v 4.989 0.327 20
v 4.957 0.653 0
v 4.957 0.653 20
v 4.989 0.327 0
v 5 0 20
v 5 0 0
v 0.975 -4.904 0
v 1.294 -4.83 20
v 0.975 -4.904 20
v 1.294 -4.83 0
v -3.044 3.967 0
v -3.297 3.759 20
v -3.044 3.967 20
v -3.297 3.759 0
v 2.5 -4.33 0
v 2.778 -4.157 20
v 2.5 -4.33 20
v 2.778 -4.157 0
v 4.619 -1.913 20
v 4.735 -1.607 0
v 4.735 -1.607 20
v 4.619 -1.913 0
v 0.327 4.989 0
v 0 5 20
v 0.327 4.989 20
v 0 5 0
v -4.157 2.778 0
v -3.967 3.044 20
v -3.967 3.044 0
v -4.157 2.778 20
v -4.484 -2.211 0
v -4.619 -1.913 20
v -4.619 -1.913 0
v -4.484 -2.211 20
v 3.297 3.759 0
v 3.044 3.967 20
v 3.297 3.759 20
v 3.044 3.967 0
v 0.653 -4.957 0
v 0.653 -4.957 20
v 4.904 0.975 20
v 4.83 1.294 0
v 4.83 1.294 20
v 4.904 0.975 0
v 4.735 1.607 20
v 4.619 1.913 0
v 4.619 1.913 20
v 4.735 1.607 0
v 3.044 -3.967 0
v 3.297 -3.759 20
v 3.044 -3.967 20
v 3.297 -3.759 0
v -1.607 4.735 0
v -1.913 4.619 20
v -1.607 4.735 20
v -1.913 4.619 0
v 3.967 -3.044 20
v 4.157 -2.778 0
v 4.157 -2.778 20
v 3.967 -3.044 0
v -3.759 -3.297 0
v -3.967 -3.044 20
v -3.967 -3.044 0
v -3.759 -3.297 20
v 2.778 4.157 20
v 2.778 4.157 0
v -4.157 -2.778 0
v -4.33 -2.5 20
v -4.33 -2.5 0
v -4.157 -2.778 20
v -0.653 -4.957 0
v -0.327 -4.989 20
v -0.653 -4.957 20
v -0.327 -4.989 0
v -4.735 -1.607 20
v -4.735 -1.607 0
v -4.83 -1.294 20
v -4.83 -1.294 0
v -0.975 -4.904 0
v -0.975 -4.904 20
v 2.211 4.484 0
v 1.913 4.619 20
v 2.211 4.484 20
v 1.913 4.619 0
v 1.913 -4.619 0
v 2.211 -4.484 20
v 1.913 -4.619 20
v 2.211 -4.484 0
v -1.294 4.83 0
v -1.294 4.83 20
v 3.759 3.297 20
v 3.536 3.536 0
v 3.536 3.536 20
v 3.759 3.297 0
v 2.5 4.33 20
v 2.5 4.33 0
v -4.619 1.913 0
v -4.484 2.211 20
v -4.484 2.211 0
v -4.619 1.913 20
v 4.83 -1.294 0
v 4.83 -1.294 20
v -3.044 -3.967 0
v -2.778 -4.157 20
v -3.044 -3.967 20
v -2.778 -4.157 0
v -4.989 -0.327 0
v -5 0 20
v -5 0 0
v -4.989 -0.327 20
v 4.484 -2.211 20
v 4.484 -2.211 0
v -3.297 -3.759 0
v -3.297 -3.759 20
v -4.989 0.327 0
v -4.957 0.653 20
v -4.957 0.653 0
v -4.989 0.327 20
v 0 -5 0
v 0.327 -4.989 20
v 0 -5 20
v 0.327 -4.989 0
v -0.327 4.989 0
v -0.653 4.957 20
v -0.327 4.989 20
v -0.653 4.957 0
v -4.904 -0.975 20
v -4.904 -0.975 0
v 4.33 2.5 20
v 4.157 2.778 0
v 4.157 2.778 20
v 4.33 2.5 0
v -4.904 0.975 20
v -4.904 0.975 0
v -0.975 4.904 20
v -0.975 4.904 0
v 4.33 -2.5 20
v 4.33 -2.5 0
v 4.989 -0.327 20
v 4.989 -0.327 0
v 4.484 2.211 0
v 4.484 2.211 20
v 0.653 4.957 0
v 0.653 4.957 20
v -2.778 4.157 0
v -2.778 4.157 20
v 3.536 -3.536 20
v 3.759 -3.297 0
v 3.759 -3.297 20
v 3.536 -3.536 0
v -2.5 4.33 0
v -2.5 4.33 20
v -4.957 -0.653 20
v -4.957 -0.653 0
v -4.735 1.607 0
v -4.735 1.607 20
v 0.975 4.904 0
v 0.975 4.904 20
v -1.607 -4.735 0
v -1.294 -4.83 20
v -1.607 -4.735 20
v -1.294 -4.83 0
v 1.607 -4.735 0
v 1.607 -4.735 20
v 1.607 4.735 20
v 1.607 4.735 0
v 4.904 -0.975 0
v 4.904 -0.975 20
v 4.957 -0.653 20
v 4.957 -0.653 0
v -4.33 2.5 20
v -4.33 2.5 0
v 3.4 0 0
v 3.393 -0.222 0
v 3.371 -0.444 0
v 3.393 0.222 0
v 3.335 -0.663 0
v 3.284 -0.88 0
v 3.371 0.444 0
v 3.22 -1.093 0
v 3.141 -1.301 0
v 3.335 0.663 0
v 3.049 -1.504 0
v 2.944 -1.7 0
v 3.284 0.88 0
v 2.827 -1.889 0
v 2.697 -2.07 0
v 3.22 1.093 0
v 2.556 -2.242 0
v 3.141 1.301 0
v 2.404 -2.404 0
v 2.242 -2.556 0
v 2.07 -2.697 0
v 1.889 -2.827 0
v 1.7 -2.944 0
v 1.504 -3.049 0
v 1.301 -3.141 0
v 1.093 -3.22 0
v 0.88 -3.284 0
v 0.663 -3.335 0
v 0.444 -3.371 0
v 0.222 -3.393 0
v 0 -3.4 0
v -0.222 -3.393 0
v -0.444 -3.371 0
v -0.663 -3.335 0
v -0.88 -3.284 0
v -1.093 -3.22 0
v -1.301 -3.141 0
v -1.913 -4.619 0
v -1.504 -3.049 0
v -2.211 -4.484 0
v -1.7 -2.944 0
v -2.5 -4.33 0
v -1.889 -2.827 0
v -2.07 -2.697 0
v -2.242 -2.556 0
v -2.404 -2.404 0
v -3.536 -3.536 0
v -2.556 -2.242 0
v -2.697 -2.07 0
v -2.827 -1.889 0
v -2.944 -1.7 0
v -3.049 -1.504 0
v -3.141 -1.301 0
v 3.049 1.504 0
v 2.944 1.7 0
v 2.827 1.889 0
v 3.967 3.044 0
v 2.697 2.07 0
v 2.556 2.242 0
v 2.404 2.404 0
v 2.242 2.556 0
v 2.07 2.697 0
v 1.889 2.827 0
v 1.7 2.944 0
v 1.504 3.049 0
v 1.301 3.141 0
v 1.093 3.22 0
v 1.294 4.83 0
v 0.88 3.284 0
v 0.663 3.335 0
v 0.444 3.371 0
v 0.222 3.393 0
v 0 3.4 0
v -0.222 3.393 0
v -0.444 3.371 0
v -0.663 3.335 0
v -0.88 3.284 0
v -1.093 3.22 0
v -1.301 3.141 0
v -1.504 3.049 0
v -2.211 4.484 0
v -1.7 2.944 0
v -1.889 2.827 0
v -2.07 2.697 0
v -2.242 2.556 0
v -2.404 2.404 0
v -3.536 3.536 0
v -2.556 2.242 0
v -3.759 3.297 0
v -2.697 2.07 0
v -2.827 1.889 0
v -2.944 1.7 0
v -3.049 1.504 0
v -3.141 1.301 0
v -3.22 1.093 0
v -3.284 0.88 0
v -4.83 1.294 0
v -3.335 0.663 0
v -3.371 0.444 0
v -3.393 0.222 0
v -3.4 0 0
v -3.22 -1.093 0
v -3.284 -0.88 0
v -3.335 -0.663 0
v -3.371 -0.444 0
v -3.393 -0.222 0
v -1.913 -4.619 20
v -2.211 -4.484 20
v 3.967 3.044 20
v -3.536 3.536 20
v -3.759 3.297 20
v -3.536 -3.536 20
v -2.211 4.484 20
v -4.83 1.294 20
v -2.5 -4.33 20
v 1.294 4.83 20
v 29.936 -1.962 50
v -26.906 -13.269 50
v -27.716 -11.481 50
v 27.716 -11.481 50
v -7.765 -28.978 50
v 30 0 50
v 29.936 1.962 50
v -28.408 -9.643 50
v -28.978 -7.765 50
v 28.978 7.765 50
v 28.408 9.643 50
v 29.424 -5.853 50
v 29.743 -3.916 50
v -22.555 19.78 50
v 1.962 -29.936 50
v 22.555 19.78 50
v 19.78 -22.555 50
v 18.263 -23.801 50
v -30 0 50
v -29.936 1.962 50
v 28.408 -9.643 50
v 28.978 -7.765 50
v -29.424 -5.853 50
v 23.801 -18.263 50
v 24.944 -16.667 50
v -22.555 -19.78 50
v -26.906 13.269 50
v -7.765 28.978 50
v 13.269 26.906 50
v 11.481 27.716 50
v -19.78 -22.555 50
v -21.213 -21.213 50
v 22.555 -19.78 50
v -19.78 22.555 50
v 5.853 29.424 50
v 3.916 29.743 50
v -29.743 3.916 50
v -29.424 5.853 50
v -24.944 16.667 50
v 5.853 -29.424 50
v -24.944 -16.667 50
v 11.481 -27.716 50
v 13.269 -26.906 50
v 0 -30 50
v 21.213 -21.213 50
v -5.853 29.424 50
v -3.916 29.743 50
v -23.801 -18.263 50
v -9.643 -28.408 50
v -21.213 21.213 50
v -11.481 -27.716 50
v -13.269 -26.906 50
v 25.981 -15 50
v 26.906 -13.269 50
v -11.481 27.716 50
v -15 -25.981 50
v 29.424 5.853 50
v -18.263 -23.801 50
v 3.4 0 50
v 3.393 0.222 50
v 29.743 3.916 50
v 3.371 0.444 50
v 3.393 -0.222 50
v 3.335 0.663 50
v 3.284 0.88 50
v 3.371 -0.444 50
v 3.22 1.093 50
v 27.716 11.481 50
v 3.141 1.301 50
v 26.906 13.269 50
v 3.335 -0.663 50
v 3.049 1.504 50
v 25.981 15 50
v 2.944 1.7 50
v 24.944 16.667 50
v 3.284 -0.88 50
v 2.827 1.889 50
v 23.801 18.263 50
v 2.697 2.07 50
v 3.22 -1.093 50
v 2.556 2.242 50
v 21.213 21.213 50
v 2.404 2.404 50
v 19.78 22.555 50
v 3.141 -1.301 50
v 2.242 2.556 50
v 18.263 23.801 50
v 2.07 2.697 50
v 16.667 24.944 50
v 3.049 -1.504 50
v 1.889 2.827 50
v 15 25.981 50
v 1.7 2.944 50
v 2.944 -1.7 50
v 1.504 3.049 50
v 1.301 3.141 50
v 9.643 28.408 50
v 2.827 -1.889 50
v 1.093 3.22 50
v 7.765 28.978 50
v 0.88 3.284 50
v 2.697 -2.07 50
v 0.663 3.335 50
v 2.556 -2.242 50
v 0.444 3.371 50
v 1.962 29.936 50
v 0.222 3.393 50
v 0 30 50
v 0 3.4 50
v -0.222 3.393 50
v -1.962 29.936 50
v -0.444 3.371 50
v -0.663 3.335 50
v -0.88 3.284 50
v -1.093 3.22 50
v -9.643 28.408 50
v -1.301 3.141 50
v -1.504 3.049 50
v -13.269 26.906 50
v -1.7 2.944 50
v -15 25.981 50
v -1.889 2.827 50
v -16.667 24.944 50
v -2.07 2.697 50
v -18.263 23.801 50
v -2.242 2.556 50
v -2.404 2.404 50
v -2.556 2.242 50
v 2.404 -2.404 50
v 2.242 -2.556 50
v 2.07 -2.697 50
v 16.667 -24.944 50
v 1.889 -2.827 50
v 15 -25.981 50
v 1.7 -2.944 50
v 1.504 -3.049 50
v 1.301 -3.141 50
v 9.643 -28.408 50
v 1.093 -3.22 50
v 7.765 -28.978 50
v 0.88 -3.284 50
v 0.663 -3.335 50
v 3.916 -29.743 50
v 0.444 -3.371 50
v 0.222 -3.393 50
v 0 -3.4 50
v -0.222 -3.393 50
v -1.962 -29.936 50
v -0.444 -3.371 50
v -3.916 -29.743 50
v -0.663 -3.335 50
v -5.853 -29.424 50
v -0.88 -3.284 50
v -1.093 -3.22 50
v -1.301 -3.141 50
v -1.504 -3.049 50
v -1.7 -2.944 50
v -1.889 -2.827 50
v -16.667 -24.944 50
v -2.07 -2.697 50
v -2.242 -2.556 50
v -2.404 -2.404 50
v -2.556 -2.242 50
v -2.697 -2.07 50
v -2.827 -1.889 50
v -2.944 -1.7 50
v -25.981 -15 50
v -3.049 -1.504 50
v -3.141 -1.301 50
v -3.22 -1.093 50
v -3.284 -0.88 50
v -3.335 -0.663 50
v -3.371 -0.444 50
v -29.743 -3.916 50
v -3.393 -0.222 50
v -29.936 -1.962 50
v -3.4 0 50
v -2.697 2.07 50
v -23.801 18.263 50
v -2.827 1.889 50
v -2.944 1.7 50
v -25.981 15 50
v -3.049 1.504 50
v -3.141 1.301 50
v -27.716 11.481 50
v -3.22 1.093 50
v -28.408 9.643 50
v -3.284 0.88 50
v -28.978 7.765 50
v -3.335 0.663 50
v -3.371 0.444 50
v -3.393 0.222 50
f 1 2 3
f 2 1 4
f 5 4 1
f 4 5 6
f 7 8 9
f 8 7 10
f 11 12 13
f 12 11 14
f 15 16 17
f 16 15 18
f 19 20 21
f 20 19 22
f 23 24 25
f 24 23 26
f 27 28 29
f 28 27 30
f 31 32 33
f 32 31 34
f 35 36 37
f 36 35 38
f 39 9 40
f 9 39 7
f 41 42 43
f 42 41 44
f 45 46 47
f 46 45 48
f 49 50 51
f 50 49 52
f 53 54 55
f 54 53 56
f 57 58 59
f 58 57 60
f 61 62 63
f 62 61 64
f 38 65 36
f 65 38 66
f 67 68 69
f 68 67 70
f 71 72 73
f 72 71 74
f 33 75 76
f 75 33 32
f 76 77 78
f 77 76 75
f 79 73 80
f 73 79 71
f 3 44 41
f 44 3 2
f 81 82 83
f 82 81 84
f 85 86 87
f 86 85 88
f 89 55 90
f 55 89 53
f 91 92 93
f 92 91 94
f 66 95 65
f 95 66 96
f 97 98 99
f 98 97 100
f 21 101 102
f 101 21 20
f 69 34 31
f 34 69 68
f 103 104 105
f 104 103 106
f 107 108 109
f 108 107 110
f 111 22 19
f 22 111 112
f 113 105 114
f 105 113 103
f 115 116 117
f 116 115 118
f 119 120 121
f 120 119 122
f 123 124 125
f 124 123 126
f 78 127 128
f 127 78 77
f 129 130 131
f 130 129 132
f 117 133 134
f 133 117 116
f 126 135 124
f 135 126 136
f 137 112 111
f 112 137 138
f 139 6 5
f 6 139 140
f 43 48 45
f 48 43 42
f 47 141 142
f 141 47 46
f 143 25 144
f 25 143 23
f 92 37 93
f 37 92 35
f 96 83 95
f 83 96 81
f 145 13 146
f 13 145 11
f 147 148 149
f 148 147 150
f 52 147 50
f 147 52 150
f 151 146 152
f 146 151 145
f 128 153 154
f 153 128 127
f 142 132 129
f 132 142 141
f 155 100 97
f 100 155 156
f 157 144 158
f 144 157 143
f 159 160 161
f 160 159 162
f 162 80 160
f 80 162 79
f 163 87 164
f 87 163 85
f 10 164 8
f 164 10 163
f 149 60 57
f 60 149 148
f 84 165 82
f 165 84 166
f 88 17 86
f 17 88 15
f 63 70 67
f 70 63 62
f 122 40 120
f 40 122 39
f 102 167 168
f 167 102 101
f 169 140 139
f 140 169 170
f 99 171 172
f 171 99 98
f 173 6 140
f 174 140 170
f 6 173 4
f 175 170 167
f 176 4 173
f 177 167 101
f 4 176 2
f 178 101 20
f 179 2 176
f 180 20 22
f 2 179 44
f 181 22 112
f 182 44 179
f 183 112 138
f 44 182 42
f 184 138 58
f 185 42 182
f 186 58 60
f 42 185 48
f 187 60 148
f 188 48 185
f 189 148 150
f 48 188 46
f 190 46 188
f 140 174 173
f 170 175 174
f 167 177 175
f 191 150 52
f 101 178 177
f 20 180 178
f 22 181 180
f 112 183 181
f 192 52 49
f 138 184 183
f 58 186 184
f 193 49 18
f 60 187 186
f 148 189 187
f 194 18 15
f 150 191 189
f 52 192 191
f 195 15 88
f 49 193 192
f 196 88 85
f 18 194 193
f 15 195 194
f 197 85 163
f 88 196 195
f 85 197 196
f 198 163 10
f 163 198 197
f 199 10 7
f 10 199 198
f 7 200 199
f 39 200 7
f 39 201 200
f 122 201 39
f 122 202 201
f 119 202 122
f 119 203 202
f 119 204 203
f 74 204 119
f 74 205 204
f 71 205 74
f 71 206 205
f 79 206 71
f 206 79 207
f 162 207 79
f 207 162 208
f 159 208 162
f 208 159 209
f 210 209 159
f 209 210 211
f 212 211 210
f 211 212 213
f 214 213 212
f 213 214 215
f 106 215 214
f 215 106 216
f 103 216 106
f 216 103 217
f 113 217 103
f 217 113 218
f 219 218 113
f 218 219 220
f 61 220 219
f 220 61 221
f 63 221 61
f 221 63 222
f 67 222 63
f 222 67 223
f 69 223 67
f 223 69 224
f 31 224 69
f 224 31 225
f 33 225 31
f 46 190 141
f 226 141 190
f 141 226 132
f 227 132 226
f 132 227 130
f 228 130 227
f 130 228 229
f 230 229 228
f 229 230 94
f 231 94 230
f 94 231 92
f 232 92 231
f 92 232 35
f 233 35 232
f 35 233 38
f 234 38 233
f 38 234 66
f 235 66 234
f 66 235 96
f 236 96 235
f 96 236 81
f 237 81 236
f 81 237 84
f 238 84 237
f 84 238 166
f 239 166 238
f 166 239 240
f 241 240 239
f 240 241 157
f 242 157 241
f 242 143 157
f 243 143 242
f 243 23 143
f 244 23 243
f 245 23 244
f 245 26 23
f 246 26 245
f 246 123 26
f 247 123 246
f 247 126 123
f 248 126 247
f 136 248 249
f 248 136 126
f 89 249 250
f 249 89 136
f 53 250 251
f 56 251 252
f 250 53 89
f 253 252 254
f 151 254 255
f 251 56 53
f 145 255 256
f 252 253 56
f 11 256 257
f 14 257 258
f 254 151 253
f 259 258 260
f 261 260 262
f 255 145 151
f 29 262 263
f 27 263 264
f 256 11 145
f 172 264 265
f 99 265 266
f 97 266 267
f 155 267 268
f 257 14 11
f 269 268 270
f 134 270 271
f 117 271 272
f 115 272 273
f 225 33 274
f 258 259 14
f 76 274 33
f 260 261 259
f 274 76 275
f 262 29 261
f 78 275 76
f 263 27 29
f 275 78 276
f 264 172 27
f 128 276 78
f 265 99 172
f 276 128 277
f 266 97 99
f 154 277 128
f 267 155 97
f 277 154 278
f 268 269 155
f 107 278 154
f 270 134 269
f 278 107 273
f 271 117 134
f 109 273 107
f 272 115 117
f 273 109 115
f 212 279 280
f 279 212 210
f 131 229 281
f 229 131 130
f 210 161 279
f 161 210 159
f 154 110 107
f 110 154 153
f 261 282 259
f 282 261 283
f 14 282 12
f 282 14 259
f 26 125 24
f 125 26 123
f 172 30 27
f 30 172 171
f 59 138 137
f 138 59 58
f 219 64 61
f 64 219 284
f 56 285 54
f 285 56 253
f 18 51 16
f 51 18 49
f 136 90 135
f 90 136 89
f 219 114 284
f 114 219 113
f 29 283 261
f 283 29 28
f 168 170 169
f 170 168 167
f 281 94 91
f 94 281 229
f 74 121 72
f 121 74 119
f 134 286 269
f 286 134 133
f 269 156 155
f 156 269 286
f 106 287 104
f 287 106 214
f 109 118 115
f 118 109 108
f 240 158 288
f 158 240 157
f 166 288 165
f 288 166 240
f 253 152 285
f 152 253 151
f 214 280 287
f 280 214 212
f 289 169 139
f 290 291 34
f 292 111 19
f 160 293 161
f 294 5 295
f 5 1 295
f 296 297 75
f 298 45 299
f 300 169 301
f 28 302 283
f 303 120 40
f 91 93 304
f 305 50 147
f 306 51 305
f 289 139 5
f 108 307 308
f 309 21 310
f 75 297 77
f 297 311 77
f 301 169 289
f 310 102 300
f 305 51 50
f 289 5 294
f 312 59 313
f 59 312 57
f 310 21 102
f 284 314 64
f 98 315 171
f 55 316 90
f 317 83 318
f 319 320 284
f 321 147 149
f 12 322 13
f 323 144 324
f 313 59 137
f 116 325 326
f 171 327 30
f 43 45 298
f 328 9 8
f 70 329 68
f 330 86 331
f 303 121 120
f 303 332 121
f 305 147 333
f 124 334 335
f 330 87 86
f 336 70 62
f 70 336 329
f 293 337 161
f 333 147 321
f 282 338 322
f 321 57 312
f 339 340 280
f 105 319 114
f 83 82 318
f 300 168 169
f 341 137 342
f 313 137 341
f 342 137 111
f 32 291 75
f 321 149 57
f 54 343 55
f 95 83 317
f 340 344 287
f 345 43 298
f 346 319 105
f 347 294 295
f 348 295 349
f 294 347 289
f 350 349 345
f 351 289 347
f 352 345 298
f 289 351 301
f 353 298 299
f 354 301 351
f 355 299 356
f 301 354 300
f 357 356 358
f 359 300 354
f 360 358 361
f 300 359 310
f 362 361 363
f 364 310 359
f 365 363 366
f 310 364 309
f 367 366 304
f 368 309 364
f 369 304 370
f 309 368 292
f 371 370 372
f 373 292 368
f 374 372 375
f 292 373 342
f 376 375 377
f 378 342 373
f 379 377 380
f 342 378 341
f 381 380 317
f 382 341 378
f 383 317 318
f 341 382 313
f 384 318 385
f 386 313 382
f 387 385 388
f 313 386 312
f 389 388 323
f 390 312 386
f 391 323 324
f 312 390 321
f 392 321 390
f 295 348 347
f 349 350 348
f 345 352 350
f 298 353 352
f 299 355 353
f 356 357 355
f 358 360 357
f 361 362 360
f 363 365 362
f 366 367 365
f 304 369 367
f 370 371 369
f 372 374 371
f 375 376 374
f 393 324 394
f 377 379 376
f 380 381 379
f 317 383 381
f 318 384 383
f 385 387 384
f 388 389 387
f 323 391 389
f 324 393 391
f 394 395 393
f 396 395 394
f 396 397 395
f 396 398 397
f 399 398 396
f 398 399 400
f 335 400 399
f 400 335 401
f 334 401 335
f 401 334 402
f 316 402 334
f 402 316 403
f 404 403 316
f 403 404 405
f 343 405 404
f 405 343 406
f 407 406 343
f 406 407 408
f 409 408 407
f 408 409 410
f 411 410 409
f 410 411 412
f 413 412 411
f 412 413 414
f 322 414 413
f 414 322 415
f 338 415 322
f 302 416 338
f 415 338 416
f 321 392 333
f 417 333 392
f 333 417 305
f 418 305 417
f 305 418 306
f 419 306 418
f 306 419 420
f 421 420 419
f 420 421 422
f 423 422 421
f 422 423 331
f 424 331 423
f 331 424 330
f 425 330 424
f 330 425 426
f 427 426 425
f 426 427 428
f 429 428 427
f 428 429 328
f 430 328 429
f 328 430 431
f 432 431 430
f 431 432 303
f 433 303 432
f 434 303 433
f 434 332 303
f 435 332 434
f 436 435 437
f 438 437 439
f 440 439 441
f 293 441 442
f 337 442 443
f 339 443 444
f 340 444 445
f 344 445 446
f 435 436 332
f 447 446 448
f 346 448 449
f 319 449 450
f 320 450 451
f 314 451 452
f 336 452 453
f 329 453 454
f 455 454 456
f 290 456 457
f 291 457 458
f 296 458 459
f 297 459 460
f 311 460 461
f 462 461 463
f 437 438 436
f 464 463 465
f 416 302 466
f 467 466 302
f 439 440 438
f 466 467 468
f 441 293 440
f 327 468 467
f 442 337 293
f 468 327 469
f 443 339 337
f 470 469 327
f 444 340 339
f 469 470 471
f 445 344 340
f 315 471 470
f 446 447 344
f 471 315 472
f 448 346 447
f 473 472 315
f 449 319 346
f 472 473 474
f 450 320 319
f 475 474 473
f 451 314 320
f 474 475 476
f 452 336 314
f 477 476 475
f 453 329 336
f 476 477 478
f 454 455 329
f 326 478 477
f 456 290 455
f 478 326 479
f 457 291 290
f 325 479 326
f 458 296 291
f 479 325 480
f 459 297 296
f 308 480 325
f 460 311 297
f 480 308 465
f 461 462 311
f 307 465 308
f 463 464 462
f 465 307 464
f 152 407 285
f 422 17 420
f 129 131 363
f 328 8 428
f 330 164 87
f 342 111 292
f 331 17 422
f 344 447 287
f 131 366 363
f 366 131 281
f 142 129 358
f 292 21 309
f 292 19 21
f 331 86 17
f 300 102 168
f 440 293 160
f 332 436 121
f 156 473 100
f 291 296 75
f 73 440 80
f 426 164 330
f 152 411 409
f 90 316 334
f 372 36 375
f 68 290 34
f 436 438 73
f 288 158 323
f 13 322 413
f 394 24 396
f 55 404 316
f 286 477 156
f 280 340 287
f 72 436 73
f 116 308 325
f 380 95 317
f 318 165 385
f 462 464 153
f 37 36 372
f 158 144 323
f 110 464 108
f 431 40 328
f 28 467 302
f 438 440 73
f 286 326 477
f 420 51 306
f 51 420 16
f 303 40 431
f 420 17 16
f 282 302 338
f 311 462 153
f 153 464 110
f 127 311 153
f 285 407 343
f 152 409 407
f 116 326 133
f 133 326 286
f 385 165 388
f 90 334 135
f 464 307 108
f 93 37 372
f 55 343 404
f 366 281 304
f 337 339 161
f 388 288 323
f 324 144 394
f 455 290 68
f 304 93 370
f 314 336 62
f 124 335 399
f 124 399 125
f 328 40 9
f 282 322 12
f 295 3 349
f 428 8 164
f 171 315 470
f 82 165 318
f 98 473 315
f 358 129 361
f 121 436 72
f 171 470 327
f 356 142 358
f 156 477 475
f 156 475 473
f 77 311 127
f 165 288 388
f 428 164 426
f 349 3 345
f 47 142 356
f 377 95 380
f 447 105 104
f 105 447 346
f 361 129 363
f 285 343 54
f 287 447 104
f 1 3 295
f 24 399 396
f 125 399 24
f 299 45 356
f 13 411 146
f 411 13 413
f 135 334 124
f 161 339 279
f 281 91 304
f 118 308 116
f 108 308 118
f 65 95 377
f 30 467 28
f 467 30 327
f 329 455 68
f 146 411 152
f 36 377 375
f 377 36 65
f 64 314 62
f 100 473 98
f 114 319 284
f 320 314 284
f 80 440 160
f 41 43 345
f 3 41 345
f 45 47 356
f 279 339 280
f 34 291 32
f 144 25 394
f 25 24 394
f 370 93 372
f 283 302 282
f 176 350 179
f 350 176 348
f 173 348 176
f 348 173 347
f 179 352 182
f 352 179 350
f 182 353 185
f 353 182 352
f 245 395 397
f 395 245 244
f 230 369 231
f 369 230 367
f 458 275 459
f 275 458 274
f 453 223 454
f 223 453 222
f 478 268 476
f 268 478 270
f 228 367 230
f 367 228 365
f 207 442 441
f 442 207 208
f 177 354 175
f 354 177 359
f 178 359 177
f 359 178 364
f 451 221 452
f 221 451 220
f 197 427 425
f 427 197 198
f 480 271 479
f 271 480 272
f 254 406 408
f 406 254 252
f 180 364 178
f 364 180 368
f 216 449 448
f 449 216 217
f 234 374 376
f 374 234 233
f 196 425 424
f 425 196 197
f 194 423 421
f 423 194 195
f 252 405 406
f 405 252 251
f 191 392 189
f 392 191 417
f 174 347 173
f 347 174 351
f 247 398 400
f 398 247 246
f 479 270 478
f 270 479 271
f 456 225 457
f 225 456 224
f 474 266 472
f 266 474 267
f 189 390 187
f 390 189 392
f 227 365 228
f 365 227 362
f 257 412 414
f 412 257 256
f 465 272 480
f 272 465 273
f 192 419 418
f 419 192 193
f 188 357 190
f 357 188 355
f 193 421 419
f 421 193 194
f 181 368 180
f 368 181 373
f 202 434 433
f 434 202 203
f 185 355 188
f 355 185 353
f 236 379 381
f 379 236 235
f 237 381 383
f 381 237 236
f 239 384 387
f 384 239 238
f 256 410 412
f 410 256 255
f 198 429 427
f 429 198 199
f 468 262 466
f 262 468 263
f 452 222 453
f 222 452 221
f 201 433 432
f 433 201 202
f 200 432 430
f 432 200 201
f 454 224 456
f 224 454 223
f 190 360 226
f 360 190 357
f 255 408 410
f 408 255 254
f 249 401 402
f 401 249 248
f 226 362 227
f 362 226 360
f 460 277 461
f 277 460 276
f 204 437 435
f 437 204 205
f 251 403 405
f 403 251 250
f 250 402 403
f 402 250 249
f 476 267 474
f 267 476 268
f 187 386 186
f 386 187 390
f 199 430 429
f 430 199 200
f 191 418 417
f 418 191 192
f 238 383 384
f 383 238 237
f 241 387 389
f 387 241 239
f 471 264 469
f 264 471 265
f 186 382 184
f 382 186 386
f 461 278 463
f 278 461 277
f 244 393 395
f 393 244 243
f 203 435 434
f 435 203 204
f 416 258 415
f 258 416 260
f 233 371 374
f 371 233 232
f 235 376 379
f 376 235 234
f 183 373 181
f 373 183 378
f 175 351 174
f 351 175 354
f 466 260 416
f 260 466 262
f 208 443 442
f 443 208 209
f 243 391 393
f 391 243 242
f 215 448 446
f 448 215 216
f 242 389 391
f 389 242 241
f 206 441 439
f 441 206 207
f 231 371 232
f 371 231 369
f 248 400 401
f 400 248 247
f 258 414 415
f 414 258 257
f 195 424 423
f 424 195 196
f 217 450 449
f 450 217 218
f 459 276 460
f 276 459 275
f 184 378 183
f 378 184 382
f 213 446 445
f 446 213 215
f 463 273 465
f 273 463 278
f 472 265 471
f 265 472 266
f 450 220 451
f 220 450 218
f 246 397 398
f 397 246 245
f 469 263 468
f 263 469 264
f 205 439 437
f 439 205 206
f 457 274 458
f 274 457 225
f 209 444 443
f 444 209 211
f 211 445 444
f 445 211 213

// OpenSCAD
// Small lab funnel - printed upright, open top and bottom
// Units: mm. One complete part, no external libraries.

// ---- Parameters ----
spout_od      = 10;    // spout outer diameter
spout_length  = 20;    // spout runs from z = 0 to z = 20
cone_bottom_d = 10;    // cone outer diameter at z = 20 (joins spout)
cone_top_d    = 60;    // cone outer diameter at rim, z = 50
wall          = 1.6;   // uniform wall thickness (spout bore = 6.8 mm)
eps           = 0.5;   // cutter overshoot past faces
$fn           = 96;    // curve resolution

// ---- Derived ----
cone_height = 50 - 20;  // cone spans z = 20 to z = 50

// ---- Model ----
difference() {
    union() {
        // Spout: straight tube from z = 0 to z = 20
        cylinder(d = spout_od, h = spout_length);

        // Cone: widens from 10 mm at z = 20 to 60 mm at z = 50
        translate([0, 0, 20])
            cylinder(d1 = cone_bottom_d, d2 = cone_top_d, h = cone_height);
    }

    // Through-bore: 6.8 mm diameter, runs from bottom (z = 0) to rim (z = 50)
    translate([0, 0, -eps])
        cylinder(d = spout_od - 2 * wall, h = spout_length + cone_height + 2 * eps);
}
